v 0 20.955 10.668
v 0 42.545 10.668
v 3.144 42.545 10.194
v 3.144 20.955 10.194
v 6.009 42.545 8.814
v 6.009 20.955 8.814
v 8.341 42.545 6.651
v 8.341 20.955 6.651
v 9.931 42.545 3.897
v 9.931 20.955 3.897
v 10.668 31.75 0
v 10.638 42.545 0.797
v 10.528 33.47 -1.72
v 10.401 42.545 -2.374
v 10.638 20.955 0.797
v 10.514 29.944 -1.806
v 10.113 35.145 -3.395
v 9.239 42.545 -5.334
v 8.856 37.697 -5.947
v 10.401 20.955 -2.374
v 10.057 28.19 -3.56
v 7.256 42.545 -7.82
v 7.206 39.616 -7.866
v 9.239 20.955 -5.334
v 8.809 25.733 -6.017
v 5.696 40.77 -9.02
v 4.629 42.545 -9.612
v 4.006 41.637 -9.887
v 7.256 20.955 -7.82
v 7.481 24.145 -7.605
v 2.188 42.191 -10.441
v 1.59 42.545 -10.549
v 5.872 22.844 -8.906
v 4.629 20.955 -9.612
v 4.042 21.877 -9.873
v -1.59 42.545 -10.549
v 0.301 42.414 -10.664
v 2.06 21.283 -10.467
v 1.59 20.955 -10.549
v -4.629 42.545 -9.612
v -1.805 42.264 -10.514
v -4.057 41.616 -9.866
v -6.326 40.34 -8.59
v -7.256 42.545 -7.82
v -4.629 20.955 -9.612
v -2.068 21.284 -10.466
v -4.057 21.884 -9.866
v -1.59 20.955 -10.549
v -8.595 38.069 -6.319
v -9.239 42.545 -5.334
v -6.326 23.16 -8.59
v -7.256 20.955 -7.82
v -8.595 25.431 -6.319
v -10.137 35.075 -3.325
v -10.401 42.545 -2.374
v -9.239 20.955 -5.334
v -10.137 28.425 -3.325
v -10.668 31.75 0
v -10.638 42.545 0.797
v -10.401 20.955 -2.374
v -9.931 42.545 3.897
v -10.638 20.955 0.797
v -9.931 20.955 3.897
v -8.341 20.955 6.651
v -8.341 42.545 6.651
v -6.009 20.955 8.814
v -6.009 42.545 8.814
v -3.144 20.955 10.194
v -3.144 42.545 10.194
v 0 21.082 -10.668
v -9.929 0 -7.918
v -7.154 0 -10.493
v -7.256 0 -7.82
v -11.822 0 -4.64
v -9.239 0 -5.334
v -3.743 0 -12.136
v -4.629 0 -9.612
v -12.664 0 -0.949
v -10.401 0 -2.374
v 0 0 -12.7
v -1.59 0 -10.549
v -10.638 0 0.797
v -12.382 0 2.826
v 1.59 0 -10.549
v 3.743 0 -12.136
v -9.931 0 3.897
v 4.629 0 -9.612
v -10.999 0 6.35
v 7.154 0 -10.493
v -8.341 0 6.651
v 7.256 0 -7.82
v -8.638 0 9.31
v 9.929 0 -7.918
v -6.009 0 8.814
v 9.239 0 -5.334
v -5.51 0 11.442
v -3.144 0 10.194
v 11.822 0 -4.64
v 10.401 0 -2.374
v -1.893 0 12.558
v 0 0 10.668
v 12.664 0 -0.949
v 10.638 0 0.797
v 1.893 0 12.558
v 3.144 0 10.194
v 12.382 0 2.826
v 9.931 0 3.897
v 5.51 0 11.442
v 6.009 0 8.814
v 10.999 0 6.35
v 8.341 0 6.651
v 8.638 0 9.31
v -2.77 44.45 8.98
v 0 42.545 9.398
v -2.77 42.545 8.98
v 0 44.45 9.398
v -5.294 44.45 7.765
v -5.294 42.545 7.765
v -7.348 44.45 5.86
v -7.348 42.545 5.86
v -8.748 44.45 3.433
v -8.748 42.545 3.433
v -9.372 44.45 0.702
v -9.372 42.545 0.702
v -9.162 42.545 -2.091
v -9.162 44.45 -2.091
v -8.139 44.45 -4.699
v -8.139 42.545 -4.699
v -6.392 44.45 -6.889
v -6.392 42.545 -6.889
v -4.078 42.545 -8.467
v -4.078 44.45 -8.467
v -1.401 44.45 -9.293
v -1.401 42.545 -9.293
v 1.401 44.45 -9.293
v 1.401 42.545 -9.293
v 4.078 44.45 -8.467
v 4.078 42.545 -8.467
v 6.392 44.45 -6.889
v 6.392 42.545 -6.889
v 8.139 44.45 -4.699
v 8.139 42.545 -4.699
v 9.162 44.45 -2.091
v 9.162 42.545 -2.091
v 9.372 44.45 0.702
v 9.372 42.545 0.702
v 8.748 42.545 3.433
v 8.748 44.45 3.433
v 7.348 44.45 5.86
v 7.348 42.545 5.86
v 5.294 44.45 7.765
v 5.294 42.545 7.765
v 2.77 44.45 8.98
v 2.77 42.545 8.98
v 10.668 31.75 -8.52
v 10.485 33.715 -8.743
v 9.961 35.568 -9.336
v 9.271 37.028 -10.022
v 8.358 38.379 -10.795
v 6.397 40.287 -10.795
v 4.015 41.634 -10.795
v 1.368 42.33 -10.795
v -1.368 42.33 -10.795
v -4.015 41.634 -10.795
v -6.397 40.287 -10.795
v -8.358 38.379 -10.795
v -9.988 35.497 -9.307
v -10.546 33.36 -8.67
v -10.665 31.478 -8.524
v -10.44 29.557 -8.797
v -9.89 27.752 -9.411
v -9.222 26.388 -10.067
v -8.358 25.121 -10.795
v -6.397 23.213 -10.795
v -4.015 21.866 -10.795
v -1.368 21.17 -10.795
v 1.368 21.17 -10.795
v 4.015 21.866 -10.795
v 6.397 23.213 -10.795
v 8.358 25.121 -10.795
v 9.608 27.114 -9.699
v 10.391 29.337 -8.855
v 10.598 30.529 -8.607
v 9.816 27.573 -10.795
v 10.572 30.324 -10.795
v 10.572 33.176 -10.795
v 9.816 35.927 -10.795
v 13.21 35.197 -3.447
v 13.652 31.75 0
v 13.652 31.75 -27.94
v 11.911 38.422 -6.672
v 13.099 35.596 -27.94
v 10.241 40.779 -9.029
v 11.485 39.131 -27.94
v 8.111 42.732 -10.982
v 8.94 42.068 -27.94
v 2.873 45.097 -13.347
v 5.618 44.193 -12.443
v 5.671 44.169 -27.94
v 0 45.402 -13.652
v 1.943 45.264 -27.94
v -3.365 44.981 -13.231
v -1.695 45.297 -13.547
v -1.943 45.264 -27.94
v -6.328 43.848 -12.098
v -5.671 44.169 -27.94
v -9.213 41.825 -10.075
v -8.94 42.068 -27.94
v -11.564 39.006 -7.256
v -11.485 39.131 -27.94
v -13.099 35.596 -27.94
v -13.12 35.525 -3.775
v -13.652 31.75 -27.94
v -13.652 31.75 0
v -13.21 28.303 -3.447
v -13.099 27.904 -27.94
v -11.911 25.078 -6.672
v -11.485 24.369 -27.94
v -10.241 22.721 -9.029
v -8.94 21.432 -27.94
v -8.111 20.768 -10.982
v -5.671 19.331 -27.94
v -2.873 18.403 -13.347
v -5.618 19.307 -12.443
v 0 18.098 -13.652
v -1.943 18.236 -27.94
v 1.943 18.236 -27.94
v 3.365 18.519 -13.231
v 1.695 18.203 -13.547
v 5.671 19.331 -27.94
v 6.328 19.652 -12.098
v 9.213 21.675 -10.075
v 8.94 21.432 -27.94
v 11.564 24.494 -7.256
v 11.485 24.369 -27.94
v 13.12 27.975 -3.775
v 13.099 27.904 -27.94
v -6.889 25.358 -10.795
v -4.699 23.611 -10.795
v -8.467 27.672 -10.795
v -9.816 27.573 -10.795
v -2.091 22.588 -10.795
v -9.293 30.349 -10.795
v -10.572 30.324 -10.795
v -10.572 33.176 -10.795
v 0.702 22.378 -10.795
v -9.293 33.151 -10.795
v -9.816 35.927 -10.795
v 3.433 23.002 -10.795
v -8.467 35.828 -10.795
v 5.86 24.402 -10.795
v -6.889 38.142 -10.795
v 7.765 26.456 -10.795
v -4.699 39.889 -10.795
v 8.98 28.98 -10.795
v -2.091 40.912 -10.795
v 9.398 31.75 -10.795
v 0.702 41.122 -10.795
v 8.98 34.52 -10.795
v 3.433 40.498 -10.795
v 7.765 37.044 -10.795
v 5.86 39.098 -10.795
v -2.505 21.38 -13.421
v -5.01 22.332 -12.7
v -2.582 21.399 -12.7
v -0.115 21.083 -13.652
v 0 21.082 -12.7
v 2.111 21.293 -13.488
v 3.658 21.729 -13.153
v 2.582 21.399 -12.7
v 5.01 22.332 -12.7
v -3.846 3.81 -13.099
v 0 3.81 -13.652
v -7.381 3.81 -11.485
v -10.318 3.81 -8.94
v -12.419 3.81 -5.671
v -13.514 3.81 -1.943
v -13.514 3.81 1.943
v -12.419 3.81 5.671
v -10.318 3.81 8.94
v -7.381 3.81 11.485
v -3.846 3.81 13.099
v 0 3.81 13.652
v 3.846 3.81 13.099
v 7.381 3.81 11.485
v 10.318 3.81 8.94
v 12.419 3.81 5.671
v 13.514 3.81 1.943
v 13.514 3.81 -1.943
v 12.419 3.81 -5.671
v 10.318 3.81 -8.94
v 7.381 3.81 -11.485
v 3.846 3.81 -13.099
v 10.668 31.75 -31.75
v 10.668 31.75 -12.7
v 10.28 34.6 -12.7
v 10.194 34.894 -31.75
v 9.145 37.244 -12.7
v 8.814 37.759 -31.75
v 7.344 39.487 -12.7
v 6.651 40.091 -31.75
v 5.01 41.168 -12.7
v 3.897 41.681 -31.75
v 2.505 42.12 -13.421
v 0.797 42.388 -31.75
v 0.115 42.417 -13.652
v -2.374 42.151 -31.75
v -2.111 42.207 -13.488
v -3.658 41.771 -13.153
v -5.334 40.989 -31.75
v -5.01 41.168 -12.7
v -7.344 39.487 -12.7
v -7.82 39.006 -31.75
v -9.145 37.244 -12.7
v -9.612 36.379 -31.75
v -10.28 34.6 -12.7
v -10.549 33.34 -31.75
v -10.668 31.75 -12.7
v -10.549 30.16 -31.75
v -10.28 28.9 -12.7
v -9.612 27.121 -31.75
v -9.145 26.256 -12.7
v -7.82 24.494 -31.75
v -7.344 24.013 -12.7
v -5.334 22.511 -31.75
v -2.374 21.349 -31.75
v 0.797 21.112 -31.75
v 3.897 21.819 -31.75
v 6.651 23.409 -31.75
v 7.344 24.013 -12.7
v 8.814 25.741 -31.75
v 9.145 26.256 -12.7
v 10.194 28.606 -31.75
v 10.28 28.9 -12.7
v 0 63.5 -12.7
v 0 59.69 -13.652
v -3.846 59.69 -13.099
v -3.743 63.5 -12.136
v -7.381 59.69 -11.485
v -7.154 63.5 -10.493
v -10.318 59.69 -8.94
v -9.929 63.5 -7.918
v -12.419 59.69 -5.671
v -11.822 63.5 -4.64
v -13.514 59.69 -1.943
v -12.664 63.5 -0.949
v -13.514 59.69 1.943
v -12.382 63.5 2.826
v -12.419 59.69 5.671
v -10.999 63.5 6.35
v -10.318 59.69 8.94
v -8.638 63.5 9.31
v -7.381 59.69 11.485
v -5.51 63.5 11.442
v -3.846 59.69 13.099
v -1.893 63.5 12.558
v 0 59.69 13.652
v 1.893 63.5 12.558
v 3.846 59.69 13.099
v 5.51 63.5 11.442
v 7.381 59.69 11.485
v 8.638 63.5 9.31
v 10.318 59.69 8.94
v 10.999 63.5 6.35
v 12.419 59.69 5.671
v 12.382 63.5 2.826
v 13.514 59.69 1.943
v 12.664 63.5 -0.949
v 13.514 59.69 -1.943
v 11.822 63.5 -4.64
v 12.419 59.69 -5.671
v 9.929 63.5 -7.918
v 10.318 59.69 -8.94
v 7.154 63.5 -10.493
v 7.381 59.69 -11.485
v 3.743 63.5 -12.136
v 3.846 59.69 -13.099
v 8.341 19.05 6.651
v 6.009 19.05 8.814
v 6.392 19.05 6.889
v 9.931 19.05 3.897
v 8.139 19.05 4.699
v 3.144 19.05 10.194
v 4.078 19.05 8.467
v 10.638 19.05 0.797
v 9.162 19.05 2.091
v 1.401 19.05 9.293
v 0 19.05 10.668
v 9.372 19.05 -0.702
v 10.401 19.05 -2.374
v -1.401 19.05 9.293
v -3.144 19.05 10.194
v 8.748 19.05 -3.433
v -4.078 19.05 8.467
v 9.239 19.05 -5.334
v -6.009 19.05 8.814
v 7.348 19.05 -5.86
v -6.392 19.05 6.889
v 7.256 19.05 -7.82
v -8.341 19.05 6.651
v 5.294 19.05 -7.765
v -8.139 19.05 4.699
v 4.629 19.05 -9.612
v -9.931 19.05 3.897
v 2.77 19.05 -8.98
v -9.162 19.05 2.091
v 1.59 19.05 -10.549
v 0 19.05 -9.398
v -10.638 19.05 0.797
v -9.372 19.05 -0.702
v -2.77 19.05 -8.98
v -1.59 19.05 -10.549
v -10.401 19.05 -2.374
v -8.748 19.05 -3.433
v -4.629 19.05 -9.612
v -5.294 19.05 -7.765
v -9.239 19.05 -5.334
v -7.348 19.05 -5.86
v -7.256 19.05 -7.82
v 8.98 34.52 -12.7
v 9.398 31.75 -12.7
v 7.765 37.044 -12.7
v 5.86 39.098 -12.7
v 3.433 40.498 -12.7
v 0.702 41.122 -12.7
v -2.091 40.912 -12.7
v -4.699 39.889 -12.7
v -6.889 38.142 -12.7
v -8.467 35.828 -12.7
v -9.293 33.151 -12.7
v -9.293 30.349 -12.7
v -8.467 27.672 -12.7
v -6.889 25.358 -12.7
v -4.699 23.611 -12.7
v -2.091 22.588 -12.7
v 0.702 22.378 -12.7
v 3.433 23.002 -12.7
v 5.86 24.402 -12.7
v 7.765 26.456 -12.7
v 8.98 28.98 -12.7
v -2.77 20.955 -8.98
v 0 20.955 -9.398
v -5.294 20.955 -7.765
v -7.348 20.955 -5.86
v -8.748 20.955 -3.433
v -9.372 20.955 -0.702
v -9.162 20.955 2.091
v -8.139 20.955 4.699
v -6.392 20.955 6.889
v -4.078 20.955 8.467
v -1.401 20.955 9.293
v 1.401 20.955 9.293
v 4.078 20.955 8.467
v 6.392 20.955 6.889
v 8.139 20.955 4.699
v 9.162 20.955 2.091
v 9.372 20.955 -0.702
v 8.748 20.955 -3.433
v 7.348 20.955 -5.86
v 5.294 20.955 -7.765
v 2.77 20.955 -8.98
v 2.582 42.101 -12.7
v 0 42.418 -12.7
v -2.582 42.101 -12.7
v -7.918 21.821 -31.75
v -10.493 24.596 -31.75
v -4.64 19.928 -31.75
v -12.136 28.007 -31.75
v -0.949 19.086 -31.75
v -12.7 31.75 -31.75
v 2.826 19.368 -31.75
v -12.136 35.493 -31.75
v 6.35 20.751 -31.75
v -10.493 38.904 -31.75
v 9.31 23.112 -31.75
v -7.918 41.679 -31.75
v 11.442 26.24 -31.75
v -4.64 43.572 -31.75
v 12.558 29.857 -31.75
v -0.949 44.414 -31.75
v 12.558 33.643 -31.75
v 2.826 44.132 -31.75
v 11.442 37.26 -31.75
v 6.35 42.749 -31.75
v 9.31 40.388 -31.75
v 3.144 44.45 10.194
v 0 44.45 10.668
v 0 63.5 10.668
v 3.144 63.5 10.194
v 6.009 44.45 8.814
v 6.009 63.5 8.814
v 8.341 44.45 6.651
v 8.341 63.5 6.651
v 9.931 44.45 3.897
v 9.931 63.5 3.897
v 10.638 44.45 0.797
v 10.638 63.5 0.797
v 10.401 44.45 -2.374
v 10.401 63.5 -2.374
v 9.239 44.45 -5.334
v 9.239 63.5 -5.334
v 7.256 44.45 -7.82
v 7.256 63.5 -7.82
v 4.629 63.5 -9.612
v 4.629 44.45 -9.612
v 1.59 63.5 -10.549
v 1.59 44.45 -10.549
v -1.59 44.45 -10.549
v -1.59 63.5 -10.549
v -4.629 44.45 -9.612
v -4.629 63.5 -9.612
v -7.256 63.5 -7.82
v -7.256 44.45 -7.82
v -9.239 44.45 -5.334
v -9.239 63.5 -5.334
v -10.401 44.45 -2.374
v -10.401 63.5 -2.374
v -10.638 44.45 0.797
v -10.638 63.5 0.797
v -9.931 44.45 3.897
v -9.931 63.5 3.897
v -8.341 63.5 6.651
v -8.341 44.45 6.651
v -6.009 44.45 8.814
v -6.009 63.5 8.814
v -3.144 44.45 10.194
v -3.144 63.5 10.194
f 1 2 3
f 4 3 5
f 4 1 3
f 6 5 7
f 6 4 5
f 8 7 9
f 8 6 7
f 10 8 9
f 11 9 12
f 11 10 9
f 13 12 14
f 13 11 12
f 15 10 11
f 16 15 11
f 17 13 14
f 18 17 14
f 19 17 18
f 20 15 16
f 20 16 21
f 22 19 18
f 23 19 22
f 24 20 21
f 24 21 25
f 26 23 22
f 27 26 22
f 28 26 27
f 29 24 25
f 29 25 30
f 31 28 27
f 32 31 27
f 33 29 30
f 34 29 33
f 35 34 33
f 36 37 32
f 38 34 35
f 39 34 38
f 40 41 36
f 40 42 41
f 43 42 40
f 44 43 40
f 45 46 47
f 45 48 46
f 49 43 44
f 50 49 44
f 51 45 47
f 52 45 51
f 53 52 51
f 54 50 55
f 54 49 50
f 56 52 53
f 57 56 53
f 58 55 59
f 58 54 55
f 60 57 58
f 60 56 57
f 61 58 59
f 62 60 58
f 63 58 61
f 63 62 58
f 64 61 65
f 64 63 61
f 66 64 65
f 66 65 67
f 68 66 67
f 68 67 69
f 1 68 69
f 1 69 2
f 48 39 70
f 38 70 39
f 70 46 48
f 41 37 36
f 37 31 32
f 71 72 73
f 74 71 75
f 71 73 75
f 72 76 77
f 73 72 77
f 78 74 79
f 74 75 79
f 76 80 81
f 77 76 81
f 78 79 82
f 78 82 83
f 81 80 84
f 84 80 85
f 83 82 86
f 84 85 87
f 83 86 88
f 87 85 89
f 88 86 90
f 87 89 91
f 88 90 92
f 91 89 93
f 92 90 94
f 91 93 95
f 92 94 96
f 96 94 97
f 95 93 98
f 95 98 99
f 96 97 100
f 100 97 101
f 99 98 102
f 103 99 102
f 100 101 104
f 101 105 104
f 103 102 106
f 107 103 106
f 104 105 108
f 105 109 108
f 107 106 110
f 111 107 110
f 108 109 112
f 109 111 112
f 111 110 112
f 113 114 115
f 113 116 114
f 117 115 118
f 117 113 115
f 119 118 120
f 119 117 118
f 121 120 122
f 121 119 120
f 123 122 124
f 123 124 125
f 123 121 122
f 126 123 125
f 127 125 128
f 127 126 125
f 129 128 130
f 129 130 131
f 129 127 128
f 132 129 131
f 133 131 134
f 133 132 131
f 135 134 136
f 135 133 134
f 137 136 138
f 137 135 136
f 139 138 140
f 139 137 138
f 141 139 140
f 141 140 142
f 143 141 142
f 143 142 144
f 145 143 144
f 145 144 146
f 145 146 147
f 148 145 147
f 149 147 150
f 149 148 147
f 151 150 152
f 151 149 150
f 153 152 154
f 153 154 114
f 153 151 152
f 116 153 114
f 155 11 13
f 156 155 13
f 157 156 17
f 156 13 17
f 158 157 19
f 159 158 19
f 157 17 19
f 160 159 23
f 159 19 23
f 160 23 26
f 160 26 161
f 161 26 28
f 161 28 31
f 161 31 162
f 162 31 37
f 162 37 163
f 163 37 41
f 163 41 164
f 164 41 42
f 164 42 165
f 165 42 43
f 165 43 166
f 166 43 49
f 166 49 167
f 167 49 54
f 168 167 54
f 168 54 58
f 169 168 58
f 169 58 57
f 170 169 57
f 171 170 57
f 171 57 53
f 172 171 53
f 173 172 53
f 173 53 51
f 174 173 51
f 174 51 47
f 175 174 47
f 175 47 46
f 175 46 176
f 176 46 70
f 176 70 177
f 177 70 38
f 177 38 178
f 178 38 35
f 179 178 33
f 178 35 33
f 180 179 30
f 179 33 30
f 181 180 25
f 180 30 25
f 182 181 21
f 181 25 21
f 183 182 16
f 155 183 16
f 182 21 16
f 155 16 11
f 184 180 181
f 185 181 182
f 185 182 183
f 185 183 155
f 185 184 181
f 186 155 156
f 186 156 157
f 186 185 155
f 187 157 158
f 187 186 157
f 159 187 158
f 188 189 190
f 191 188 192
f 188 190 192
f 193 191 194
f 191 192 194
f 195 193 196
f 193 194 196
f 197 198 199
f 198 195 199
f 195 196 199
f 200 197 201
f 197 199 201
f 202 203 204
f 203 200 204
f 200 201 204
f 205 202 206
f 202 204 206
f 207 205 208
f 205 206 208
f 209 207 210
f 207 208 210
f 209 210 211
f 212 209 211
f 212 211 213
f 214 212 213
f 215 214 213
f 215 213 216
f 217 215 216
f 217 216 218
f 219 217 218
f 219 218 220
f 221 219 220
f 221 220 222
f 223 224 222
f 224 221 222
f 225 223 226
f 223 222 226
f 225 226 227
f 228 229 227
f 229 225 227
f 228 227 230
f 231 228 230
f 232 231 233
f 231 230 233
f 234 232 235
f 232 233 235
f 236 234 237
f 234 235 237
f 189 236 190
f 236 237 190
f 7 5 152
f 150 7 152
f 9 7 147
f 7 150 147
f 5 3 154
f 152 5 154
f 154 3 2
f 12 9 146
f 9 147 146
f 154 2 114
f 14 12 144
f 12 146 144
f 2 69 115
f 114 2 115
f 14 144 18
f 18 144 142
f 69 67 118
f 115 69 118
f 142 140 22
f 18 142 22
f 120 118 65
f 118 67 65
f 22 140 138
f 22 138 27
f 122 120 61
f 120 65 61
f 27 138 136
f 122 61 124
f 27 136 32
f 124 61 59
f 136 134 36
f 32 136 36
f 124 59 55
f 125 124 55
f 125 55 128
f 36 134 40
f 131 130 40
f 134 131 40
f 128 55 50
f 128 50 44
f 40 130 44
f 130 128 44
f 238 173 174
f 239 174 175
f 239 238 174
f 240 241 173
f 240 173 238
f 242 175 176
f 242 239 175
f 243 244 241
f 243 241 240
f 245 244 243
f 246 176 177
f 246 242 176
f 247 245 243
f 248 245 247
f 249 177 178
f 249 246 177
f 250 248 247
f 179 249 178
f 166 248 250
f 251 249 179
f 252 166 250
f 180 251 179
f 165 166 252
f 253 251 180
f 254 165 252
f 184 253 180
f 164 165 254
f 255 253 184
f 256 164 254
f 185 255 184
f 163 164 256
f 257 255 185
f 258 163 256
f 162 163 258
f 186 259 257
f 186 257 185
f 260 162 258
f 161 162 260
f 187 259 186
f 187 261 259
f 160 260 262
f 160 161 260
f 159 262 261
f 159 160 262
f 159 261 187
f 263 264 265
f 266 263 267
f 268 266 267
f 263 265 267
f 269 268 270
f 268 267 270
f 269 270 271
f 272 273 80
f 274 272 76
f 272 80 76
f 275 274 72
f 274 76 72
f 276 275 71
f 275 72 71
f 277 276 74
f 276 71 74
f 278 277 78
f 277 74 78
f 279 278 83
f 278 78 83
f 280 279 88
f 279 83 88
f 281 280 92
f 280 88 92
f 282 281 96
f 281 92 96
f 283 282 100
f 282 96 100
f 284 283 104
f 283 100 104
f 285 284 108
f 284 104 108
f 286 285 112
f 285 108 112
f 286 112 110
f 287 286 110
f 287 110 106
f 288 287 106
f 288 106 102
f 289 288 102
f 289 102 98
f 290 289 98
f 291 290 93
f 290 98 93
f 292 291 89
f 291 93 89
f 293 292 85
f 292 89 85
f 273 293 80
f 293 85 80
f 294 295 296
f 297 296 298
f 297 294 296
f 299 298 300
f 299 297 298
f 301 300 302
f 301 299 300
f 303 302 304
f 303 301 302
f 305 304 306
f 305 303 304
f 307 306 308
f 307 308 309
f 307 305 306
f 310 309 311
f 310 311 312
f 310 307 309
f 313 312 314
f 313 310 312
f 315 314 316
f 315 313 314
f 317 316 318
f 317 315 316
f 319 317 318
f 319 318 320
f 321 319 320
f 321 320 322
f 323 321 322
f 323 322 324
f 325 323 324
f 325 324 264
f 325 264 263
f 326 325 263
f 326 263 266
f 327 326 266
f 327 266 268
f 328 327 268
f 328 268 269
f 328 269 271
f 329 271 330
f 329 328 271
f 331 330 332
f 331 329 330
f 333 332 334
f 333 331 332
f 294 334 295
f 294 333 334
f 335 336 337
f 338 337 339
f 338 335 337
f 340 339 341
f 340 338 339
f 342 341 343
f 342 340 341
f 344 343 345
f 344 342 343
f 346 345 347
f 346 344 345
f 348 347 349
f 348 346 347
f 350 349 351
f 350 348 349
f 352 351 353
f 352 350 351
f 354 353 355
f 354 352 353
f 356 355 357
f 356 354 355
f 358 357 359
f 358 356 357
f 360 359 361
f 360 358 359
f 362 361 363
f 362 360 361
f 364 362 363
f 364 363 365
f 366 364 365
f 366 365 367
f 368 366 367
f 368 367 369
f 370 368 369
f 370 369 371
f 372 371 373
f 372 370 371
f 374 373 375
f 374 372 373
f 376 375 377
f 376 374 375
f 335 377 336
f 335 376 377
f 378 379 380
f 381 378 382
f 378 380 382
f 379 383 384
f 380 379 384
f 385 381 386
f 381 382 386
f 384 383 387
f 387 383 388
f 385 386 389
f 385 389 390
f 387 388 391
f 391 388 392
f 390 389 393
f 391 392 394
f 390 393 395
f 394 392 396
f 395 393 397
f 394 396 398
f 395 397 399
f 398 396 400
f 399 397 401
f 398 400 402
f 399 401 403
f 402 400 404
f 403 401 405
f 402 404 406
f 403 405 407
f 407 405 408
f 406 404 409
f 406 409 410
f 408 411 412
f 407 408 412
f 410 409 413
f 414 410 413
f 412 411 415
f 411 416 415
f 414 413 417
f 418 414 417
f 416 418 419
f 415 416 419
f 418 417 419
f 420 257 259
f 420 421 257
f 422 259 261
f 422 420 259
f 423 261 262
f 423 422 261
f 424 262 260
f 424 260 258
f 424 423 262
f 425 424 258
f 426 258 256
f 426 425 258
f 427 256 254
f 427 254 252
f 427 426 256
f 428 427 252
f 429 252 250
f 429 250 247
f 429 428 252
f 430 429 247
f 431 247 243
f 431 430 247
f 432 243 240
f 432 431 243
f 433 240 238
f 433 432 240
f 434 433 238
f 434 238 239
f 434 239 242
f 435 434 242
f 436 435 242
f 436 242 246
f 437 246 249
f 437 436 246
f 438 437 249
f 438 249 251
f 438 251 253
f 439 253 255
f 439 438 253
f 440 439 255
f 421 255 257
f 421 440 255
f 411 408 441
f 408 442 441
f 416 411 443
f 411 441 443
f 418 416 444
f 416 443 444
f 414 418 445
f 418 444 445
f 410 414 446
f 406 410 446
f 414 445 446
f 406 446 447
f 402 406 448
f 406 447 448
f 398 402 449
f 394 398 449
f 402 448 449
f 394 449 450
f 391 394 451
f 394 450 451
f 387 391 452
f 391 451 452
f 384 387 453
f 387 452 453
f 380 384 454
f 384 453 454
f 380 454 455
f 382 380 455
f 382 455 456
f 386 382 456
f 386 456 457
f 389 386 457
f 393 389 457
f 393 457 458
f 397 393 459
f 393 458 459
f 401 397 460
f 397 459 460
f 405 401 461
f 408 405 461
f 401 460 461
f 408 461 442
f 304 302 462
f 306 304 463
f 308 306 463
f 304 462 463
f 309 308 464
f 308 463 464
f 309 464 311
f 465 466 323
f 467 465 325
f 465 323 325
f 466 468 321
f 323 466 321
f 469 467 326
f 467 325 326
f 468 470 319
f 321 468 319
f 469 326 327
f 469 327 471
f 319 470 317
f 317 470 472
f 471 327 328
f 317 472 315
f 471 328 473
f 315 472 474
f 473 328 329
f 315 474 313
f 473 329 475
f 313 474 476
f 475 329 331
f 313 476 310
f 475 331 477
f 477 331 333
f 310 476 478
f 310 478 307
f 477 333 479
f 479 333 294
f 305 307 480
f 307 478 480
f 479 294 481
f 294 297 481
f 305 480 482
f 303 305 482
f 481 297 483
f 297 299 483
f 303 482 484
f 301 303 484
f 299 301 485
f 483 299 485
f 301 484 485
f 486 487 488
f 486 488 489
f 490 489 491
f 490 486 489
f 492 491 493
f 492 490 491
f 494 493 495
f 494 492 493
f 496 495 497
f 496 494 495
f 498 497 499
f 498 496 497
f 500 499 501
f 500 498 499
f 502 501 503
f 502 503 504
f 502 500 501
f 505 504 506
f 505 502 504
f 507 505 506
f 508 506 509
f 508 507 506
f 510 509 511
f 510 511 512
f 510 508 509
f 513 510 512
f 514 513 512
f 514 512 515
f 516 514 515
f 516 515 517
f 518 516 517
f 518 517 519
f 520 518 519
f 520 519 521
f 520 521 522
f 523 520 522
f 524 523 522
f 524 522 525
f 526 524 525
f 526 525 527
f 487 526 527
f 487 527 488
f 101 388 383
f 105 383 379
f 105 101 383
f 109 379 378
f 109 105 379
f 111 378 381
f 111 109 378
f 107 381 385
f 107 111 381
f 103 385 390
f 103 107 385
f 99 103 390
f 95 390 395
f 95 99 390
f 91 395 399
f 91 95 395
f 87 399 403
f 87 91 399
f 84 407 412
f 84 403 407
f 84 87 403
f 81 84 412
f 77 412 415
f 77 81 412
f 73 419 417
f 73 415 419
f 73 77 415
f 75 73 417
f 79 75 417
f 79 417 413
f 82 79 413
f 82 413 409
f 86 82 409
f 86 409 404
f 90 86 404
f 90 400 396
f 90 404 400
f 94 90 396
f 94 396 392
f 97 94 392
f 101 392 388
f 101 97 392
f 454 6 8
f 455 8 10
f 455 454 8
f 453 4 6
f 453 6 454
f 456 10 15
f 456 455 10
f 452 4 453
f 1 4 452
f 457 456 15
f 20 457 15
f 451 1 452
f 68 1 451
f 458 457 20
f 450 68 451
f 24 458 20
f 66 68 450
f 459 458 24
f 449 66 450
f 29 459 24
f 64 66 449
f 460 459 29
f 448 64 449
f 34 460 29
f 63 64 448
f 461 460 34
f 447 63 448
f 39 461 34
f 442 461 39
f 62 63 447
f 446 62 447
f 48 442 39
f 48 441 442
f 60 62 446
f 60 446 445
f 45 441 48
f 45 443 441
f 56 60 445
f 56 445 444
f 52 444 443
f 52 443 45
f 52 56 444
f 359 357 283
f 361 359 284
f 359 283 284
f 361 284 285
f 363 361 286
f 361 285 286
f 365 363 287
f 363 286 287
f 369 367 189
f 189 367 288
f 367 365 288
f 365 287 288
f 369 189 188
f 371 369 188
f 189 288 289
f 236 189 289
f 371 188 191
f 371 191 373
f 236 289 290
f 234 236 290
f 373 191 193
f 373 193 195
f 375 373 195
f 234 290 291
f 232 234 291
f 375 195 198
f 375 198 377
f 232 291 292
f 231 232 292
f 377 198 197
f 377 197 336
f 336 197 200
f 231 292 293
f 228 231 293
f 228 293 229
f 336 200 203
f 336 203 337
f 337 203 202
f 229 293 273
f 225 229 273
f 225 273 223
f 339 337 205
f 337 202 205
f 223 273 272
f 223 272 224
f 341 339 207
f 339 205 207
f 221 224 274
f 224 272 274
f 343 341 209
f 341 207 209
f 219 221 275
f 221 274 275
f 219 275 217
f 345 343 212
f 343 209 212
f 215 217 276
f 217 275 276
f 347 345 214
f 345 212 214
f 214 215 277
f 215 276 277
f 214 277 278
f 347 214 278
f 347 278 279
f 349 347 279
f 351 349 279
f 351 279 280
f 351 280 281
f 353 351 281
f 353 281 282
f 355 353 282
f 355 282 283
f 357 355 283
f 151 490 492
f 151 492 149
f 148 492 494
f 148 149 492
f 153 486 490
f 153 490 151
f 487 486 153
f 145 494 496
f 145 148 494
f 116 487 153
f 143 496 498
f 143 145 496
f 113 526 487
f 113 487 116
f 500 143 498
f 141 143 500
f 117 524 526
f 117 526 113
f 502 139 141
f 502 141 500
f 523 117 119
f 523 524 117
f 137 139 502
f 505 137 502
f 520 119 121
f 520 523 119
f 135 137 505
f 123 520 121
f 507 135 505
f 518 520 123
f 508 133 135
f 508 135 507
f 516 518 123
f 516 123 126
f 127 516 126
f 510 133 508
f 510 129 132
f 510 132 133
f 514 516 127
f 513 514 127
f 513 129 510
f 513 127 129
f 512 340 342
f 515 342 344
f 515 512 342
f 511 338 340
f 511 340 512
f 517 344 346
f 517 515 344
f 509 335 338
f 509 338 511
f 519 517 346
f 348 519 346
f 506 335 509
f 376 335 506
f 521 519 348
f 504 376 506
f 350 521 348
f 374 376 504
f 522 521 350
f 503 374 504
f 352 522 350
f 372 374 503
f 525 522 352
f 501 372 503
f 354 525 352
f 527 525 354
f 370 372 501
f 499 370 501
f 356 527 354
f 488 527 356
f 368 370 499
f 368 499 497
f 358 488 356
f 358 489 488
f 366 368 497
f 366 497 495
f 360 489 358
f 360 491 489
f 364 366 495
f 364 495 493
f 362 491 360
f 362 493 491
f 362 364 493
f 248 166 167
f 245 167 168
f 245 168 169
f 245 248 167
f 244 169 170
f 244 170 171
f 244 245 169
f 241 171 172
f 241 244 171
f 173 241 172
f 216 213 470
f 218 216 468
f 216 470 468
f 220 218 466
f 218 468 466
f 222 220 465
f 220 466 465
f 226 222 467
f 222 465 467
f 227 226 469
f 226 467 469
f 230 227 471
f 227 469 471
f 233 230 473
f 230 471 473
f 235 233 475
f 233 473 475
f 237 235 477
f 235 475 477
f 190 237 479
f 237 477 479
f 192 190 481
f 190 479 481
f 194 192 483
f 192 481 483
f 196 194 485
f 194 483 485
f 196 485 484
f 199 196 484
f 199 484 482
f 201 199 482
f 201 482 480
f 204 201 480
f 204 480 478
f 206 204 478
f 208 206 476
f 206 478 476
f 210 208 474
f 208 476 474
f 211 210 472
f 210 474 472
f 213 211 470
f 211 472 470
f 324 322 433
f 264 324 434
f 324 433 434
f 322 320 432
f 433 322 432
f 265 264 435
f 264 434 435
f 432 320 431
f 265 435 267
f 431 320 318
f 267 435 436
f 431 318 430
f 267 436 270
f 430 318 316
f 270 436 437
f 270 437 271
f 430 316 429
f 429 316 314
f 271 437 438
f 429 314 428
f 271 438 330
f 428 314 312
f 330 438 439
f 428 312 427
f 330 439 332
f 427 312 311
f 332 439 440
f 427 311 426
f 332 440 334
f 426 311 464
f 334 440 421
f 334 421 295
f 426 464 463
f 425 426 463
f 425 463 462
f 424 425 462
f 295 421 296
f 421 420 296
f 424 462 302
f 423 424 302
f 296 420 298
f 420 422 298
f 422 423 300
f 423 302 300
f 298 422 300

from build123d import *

# Parameters (mm, degrees)
SKETCH1_R                = 13.6525
SKETCH1_R_2              = 10.668
BOSS_EXTRUDE1_DEPTH      = 63.5
SKETCH3_R                = 10.668
CUT_EXTRUDE2_DEPTH       = 69.85
BOSS_EXTRUDE2_REACH      = 81.247
BOSS_EXTRUDE2_END_RADIUS = 13.6525
SKETCH4_R                = 13.6525
SKETCH4_R_2              = 10.668
SKETCH5_W                = 1.905
SKETCH5_H                = 1.27
SKETCH6_W                = 1.27
SKETCH6_H                = 1.905
SKETCH7_W                = 1.27
SKETCH7_H                = 1.905


with BuildPart() as part:
    # Sketch1 → Boss-Extrude1 (new body)
    with BuildSketch(Plane(origin=(0, 0, 0), x_dir=(1, 0, 0), z_dir=(0, 1, 0))):
        with Locations(Location((0, 0, 0), (0, 0, 270))):
            Circle(SKETCH1_R)
        with Locations(Location((0, 0, 0), (0, 0, 270))):
            Circle(SKETCH1_R_2, mode=Mode.SUBTRACT)
    extrude(amount=BOSS_EXTRUDE1_DEPTH)

    # Sketch3 → Cut-Extrude2 (cut)
    with BuildSketch(Plane.XY):
        with Locations((0, 31.75)):
            Circle(SKETCH3_R)
    extrude(amount=-CUT_EXTRUDE2_DEPTH, mode=Mode.SUBTRACT)

    # Boss-Extrude2: up to this cylinder (the profile starts outside it)
    boss_extrude2_end = Plane(origin=(0, 31.75, 0), z_dir=(0, -1, 0)) * Cylinder(BOSS_EXTRUDE2_END_RADIUS, 190.799, mode=Mode.PRIVATE)
    # Sketch4 → Boss-Extrude2 (add, up to the surface)
    with BuildSketch(Plane.XY.offset(-31.75), mode=Mode.PRIVATE) as boss_extrude2_sk1:
        with Locations((0, 31.75)):
            Circle(SKETCH4_R)
        with Locations((0, 31.75)):
            Circle(SKETCH4_R_2, mode=Mode.SUBTRACT)
    boss_extrude2_tool1 = extrude(boss_extrude2_sk1.sketch, amount=BOSS_EXTRUDE2_REACH, mode=Mode.PRIVATE) - boss_extrude2_end
    add(boss_extrude2_tool1.solids().sort_by_distance((-13.266349, 31.75, -31.75))[0])

    # Sketch5 → Revolve1 (revolve)
    with BuildSketch(Plane(origin=(0, 0, 0), x_dir=(0, 0, -1), z_dir=(1, 0, 0)), mode=Mode.PRIVATE) as revolve1_sk:
        with Locations((11.7475, 21.717)):
            Rectangle(SKETCH5_W, SKETCH5_H)
    revolve(revolve1_sk.sketch.rotate(Axis((0, 31.75, -31.75), (0, 0, 1)), 90), axis=Axis((0, 31.75, -31.75), (0, 0, 1)))

    # Sketch6 → Revolve2 (revolve)
    with BuildSketch(Plane(origin=(0, 0, 0), x_dir=(0, 0, -1), z_dir=(1, 0, 0)), mode=Mode.PRIVATE) as revolve2_sk:
        with Locations((10.033, 43.4975)):
            Rectangle(SKETCH6_W, SKETCH6_H)
    revolve(revolve2_sk.sketch.rotate(Axis((0, 63.5, 0), (0, -1, 0)), 180), axis=Axis((0, 63.5, 0), (0, -1, 0)))

    # Sketch7 → Revolve3 (revolve)
    with BuildSketch(Plane(origin=(0, 0, 0), x_dir=(0, 0, -1), z_dir=(1, 0, 0)), mode=Mode.PRIVATE) as revolve3_sk:
        with Locations((-10.033, 20.0025)):
            Rectangle(SKETCH7_W, SKETCH7_H)
    revolve(revolve3_sk.sketch.rotate(Axis((0, 0, 0), (0, 1, 0)), 180), axis=Axis((0, 0, 0), (0, 1, 0)))

    # Sketch8 → Cut-Revolve1 (revolve, cut)
    with BuildSketch(Plane.XY, mode=Mode.PRIVATE) as cut_revolve1_sk:
        Polygon((13.6525, 0), (13.6525, 3.81), (12.7, 0), align=None)
    cut_revolve1 = revolve(cut_revolve1_sk.sketch.rotate(Axis((0, 0, 0), (0, 1, 0)), 90), axis=Axis((0, 0, 0), (0, 1, 0)), mode=Mode.SUBTRACT)

    # Mirror1: Cut-Revolve1 across plane
    add(cut_revolve1.mirror(Plane.ZX.offset(31.75)), mode=Mode.SUBTRACT)

    # Sketch9 → Cut-Revolve2 (revolve, cut)
    with BuildSketch(Plane(origin=(0, 0, 0), x_dir=(0, 0, -1), z_dir=(1, 0, 0)), mode=Mode.PRIVATE) as cut_revolve2_sk:
        Polygon((31.75, 18.0975), (27.94, 18.0975), (31.75, 19.05), align=None)
    revolve(cut_revolve2_sk.sketch.rotate(Axis((0, 31.75, -31.75), (0, 0, 1)), 270), axis=Axis((0, 31.75, -31.75), (0, 0, 1)), mode=Mode.SUBTRACT)


solid = part.part
